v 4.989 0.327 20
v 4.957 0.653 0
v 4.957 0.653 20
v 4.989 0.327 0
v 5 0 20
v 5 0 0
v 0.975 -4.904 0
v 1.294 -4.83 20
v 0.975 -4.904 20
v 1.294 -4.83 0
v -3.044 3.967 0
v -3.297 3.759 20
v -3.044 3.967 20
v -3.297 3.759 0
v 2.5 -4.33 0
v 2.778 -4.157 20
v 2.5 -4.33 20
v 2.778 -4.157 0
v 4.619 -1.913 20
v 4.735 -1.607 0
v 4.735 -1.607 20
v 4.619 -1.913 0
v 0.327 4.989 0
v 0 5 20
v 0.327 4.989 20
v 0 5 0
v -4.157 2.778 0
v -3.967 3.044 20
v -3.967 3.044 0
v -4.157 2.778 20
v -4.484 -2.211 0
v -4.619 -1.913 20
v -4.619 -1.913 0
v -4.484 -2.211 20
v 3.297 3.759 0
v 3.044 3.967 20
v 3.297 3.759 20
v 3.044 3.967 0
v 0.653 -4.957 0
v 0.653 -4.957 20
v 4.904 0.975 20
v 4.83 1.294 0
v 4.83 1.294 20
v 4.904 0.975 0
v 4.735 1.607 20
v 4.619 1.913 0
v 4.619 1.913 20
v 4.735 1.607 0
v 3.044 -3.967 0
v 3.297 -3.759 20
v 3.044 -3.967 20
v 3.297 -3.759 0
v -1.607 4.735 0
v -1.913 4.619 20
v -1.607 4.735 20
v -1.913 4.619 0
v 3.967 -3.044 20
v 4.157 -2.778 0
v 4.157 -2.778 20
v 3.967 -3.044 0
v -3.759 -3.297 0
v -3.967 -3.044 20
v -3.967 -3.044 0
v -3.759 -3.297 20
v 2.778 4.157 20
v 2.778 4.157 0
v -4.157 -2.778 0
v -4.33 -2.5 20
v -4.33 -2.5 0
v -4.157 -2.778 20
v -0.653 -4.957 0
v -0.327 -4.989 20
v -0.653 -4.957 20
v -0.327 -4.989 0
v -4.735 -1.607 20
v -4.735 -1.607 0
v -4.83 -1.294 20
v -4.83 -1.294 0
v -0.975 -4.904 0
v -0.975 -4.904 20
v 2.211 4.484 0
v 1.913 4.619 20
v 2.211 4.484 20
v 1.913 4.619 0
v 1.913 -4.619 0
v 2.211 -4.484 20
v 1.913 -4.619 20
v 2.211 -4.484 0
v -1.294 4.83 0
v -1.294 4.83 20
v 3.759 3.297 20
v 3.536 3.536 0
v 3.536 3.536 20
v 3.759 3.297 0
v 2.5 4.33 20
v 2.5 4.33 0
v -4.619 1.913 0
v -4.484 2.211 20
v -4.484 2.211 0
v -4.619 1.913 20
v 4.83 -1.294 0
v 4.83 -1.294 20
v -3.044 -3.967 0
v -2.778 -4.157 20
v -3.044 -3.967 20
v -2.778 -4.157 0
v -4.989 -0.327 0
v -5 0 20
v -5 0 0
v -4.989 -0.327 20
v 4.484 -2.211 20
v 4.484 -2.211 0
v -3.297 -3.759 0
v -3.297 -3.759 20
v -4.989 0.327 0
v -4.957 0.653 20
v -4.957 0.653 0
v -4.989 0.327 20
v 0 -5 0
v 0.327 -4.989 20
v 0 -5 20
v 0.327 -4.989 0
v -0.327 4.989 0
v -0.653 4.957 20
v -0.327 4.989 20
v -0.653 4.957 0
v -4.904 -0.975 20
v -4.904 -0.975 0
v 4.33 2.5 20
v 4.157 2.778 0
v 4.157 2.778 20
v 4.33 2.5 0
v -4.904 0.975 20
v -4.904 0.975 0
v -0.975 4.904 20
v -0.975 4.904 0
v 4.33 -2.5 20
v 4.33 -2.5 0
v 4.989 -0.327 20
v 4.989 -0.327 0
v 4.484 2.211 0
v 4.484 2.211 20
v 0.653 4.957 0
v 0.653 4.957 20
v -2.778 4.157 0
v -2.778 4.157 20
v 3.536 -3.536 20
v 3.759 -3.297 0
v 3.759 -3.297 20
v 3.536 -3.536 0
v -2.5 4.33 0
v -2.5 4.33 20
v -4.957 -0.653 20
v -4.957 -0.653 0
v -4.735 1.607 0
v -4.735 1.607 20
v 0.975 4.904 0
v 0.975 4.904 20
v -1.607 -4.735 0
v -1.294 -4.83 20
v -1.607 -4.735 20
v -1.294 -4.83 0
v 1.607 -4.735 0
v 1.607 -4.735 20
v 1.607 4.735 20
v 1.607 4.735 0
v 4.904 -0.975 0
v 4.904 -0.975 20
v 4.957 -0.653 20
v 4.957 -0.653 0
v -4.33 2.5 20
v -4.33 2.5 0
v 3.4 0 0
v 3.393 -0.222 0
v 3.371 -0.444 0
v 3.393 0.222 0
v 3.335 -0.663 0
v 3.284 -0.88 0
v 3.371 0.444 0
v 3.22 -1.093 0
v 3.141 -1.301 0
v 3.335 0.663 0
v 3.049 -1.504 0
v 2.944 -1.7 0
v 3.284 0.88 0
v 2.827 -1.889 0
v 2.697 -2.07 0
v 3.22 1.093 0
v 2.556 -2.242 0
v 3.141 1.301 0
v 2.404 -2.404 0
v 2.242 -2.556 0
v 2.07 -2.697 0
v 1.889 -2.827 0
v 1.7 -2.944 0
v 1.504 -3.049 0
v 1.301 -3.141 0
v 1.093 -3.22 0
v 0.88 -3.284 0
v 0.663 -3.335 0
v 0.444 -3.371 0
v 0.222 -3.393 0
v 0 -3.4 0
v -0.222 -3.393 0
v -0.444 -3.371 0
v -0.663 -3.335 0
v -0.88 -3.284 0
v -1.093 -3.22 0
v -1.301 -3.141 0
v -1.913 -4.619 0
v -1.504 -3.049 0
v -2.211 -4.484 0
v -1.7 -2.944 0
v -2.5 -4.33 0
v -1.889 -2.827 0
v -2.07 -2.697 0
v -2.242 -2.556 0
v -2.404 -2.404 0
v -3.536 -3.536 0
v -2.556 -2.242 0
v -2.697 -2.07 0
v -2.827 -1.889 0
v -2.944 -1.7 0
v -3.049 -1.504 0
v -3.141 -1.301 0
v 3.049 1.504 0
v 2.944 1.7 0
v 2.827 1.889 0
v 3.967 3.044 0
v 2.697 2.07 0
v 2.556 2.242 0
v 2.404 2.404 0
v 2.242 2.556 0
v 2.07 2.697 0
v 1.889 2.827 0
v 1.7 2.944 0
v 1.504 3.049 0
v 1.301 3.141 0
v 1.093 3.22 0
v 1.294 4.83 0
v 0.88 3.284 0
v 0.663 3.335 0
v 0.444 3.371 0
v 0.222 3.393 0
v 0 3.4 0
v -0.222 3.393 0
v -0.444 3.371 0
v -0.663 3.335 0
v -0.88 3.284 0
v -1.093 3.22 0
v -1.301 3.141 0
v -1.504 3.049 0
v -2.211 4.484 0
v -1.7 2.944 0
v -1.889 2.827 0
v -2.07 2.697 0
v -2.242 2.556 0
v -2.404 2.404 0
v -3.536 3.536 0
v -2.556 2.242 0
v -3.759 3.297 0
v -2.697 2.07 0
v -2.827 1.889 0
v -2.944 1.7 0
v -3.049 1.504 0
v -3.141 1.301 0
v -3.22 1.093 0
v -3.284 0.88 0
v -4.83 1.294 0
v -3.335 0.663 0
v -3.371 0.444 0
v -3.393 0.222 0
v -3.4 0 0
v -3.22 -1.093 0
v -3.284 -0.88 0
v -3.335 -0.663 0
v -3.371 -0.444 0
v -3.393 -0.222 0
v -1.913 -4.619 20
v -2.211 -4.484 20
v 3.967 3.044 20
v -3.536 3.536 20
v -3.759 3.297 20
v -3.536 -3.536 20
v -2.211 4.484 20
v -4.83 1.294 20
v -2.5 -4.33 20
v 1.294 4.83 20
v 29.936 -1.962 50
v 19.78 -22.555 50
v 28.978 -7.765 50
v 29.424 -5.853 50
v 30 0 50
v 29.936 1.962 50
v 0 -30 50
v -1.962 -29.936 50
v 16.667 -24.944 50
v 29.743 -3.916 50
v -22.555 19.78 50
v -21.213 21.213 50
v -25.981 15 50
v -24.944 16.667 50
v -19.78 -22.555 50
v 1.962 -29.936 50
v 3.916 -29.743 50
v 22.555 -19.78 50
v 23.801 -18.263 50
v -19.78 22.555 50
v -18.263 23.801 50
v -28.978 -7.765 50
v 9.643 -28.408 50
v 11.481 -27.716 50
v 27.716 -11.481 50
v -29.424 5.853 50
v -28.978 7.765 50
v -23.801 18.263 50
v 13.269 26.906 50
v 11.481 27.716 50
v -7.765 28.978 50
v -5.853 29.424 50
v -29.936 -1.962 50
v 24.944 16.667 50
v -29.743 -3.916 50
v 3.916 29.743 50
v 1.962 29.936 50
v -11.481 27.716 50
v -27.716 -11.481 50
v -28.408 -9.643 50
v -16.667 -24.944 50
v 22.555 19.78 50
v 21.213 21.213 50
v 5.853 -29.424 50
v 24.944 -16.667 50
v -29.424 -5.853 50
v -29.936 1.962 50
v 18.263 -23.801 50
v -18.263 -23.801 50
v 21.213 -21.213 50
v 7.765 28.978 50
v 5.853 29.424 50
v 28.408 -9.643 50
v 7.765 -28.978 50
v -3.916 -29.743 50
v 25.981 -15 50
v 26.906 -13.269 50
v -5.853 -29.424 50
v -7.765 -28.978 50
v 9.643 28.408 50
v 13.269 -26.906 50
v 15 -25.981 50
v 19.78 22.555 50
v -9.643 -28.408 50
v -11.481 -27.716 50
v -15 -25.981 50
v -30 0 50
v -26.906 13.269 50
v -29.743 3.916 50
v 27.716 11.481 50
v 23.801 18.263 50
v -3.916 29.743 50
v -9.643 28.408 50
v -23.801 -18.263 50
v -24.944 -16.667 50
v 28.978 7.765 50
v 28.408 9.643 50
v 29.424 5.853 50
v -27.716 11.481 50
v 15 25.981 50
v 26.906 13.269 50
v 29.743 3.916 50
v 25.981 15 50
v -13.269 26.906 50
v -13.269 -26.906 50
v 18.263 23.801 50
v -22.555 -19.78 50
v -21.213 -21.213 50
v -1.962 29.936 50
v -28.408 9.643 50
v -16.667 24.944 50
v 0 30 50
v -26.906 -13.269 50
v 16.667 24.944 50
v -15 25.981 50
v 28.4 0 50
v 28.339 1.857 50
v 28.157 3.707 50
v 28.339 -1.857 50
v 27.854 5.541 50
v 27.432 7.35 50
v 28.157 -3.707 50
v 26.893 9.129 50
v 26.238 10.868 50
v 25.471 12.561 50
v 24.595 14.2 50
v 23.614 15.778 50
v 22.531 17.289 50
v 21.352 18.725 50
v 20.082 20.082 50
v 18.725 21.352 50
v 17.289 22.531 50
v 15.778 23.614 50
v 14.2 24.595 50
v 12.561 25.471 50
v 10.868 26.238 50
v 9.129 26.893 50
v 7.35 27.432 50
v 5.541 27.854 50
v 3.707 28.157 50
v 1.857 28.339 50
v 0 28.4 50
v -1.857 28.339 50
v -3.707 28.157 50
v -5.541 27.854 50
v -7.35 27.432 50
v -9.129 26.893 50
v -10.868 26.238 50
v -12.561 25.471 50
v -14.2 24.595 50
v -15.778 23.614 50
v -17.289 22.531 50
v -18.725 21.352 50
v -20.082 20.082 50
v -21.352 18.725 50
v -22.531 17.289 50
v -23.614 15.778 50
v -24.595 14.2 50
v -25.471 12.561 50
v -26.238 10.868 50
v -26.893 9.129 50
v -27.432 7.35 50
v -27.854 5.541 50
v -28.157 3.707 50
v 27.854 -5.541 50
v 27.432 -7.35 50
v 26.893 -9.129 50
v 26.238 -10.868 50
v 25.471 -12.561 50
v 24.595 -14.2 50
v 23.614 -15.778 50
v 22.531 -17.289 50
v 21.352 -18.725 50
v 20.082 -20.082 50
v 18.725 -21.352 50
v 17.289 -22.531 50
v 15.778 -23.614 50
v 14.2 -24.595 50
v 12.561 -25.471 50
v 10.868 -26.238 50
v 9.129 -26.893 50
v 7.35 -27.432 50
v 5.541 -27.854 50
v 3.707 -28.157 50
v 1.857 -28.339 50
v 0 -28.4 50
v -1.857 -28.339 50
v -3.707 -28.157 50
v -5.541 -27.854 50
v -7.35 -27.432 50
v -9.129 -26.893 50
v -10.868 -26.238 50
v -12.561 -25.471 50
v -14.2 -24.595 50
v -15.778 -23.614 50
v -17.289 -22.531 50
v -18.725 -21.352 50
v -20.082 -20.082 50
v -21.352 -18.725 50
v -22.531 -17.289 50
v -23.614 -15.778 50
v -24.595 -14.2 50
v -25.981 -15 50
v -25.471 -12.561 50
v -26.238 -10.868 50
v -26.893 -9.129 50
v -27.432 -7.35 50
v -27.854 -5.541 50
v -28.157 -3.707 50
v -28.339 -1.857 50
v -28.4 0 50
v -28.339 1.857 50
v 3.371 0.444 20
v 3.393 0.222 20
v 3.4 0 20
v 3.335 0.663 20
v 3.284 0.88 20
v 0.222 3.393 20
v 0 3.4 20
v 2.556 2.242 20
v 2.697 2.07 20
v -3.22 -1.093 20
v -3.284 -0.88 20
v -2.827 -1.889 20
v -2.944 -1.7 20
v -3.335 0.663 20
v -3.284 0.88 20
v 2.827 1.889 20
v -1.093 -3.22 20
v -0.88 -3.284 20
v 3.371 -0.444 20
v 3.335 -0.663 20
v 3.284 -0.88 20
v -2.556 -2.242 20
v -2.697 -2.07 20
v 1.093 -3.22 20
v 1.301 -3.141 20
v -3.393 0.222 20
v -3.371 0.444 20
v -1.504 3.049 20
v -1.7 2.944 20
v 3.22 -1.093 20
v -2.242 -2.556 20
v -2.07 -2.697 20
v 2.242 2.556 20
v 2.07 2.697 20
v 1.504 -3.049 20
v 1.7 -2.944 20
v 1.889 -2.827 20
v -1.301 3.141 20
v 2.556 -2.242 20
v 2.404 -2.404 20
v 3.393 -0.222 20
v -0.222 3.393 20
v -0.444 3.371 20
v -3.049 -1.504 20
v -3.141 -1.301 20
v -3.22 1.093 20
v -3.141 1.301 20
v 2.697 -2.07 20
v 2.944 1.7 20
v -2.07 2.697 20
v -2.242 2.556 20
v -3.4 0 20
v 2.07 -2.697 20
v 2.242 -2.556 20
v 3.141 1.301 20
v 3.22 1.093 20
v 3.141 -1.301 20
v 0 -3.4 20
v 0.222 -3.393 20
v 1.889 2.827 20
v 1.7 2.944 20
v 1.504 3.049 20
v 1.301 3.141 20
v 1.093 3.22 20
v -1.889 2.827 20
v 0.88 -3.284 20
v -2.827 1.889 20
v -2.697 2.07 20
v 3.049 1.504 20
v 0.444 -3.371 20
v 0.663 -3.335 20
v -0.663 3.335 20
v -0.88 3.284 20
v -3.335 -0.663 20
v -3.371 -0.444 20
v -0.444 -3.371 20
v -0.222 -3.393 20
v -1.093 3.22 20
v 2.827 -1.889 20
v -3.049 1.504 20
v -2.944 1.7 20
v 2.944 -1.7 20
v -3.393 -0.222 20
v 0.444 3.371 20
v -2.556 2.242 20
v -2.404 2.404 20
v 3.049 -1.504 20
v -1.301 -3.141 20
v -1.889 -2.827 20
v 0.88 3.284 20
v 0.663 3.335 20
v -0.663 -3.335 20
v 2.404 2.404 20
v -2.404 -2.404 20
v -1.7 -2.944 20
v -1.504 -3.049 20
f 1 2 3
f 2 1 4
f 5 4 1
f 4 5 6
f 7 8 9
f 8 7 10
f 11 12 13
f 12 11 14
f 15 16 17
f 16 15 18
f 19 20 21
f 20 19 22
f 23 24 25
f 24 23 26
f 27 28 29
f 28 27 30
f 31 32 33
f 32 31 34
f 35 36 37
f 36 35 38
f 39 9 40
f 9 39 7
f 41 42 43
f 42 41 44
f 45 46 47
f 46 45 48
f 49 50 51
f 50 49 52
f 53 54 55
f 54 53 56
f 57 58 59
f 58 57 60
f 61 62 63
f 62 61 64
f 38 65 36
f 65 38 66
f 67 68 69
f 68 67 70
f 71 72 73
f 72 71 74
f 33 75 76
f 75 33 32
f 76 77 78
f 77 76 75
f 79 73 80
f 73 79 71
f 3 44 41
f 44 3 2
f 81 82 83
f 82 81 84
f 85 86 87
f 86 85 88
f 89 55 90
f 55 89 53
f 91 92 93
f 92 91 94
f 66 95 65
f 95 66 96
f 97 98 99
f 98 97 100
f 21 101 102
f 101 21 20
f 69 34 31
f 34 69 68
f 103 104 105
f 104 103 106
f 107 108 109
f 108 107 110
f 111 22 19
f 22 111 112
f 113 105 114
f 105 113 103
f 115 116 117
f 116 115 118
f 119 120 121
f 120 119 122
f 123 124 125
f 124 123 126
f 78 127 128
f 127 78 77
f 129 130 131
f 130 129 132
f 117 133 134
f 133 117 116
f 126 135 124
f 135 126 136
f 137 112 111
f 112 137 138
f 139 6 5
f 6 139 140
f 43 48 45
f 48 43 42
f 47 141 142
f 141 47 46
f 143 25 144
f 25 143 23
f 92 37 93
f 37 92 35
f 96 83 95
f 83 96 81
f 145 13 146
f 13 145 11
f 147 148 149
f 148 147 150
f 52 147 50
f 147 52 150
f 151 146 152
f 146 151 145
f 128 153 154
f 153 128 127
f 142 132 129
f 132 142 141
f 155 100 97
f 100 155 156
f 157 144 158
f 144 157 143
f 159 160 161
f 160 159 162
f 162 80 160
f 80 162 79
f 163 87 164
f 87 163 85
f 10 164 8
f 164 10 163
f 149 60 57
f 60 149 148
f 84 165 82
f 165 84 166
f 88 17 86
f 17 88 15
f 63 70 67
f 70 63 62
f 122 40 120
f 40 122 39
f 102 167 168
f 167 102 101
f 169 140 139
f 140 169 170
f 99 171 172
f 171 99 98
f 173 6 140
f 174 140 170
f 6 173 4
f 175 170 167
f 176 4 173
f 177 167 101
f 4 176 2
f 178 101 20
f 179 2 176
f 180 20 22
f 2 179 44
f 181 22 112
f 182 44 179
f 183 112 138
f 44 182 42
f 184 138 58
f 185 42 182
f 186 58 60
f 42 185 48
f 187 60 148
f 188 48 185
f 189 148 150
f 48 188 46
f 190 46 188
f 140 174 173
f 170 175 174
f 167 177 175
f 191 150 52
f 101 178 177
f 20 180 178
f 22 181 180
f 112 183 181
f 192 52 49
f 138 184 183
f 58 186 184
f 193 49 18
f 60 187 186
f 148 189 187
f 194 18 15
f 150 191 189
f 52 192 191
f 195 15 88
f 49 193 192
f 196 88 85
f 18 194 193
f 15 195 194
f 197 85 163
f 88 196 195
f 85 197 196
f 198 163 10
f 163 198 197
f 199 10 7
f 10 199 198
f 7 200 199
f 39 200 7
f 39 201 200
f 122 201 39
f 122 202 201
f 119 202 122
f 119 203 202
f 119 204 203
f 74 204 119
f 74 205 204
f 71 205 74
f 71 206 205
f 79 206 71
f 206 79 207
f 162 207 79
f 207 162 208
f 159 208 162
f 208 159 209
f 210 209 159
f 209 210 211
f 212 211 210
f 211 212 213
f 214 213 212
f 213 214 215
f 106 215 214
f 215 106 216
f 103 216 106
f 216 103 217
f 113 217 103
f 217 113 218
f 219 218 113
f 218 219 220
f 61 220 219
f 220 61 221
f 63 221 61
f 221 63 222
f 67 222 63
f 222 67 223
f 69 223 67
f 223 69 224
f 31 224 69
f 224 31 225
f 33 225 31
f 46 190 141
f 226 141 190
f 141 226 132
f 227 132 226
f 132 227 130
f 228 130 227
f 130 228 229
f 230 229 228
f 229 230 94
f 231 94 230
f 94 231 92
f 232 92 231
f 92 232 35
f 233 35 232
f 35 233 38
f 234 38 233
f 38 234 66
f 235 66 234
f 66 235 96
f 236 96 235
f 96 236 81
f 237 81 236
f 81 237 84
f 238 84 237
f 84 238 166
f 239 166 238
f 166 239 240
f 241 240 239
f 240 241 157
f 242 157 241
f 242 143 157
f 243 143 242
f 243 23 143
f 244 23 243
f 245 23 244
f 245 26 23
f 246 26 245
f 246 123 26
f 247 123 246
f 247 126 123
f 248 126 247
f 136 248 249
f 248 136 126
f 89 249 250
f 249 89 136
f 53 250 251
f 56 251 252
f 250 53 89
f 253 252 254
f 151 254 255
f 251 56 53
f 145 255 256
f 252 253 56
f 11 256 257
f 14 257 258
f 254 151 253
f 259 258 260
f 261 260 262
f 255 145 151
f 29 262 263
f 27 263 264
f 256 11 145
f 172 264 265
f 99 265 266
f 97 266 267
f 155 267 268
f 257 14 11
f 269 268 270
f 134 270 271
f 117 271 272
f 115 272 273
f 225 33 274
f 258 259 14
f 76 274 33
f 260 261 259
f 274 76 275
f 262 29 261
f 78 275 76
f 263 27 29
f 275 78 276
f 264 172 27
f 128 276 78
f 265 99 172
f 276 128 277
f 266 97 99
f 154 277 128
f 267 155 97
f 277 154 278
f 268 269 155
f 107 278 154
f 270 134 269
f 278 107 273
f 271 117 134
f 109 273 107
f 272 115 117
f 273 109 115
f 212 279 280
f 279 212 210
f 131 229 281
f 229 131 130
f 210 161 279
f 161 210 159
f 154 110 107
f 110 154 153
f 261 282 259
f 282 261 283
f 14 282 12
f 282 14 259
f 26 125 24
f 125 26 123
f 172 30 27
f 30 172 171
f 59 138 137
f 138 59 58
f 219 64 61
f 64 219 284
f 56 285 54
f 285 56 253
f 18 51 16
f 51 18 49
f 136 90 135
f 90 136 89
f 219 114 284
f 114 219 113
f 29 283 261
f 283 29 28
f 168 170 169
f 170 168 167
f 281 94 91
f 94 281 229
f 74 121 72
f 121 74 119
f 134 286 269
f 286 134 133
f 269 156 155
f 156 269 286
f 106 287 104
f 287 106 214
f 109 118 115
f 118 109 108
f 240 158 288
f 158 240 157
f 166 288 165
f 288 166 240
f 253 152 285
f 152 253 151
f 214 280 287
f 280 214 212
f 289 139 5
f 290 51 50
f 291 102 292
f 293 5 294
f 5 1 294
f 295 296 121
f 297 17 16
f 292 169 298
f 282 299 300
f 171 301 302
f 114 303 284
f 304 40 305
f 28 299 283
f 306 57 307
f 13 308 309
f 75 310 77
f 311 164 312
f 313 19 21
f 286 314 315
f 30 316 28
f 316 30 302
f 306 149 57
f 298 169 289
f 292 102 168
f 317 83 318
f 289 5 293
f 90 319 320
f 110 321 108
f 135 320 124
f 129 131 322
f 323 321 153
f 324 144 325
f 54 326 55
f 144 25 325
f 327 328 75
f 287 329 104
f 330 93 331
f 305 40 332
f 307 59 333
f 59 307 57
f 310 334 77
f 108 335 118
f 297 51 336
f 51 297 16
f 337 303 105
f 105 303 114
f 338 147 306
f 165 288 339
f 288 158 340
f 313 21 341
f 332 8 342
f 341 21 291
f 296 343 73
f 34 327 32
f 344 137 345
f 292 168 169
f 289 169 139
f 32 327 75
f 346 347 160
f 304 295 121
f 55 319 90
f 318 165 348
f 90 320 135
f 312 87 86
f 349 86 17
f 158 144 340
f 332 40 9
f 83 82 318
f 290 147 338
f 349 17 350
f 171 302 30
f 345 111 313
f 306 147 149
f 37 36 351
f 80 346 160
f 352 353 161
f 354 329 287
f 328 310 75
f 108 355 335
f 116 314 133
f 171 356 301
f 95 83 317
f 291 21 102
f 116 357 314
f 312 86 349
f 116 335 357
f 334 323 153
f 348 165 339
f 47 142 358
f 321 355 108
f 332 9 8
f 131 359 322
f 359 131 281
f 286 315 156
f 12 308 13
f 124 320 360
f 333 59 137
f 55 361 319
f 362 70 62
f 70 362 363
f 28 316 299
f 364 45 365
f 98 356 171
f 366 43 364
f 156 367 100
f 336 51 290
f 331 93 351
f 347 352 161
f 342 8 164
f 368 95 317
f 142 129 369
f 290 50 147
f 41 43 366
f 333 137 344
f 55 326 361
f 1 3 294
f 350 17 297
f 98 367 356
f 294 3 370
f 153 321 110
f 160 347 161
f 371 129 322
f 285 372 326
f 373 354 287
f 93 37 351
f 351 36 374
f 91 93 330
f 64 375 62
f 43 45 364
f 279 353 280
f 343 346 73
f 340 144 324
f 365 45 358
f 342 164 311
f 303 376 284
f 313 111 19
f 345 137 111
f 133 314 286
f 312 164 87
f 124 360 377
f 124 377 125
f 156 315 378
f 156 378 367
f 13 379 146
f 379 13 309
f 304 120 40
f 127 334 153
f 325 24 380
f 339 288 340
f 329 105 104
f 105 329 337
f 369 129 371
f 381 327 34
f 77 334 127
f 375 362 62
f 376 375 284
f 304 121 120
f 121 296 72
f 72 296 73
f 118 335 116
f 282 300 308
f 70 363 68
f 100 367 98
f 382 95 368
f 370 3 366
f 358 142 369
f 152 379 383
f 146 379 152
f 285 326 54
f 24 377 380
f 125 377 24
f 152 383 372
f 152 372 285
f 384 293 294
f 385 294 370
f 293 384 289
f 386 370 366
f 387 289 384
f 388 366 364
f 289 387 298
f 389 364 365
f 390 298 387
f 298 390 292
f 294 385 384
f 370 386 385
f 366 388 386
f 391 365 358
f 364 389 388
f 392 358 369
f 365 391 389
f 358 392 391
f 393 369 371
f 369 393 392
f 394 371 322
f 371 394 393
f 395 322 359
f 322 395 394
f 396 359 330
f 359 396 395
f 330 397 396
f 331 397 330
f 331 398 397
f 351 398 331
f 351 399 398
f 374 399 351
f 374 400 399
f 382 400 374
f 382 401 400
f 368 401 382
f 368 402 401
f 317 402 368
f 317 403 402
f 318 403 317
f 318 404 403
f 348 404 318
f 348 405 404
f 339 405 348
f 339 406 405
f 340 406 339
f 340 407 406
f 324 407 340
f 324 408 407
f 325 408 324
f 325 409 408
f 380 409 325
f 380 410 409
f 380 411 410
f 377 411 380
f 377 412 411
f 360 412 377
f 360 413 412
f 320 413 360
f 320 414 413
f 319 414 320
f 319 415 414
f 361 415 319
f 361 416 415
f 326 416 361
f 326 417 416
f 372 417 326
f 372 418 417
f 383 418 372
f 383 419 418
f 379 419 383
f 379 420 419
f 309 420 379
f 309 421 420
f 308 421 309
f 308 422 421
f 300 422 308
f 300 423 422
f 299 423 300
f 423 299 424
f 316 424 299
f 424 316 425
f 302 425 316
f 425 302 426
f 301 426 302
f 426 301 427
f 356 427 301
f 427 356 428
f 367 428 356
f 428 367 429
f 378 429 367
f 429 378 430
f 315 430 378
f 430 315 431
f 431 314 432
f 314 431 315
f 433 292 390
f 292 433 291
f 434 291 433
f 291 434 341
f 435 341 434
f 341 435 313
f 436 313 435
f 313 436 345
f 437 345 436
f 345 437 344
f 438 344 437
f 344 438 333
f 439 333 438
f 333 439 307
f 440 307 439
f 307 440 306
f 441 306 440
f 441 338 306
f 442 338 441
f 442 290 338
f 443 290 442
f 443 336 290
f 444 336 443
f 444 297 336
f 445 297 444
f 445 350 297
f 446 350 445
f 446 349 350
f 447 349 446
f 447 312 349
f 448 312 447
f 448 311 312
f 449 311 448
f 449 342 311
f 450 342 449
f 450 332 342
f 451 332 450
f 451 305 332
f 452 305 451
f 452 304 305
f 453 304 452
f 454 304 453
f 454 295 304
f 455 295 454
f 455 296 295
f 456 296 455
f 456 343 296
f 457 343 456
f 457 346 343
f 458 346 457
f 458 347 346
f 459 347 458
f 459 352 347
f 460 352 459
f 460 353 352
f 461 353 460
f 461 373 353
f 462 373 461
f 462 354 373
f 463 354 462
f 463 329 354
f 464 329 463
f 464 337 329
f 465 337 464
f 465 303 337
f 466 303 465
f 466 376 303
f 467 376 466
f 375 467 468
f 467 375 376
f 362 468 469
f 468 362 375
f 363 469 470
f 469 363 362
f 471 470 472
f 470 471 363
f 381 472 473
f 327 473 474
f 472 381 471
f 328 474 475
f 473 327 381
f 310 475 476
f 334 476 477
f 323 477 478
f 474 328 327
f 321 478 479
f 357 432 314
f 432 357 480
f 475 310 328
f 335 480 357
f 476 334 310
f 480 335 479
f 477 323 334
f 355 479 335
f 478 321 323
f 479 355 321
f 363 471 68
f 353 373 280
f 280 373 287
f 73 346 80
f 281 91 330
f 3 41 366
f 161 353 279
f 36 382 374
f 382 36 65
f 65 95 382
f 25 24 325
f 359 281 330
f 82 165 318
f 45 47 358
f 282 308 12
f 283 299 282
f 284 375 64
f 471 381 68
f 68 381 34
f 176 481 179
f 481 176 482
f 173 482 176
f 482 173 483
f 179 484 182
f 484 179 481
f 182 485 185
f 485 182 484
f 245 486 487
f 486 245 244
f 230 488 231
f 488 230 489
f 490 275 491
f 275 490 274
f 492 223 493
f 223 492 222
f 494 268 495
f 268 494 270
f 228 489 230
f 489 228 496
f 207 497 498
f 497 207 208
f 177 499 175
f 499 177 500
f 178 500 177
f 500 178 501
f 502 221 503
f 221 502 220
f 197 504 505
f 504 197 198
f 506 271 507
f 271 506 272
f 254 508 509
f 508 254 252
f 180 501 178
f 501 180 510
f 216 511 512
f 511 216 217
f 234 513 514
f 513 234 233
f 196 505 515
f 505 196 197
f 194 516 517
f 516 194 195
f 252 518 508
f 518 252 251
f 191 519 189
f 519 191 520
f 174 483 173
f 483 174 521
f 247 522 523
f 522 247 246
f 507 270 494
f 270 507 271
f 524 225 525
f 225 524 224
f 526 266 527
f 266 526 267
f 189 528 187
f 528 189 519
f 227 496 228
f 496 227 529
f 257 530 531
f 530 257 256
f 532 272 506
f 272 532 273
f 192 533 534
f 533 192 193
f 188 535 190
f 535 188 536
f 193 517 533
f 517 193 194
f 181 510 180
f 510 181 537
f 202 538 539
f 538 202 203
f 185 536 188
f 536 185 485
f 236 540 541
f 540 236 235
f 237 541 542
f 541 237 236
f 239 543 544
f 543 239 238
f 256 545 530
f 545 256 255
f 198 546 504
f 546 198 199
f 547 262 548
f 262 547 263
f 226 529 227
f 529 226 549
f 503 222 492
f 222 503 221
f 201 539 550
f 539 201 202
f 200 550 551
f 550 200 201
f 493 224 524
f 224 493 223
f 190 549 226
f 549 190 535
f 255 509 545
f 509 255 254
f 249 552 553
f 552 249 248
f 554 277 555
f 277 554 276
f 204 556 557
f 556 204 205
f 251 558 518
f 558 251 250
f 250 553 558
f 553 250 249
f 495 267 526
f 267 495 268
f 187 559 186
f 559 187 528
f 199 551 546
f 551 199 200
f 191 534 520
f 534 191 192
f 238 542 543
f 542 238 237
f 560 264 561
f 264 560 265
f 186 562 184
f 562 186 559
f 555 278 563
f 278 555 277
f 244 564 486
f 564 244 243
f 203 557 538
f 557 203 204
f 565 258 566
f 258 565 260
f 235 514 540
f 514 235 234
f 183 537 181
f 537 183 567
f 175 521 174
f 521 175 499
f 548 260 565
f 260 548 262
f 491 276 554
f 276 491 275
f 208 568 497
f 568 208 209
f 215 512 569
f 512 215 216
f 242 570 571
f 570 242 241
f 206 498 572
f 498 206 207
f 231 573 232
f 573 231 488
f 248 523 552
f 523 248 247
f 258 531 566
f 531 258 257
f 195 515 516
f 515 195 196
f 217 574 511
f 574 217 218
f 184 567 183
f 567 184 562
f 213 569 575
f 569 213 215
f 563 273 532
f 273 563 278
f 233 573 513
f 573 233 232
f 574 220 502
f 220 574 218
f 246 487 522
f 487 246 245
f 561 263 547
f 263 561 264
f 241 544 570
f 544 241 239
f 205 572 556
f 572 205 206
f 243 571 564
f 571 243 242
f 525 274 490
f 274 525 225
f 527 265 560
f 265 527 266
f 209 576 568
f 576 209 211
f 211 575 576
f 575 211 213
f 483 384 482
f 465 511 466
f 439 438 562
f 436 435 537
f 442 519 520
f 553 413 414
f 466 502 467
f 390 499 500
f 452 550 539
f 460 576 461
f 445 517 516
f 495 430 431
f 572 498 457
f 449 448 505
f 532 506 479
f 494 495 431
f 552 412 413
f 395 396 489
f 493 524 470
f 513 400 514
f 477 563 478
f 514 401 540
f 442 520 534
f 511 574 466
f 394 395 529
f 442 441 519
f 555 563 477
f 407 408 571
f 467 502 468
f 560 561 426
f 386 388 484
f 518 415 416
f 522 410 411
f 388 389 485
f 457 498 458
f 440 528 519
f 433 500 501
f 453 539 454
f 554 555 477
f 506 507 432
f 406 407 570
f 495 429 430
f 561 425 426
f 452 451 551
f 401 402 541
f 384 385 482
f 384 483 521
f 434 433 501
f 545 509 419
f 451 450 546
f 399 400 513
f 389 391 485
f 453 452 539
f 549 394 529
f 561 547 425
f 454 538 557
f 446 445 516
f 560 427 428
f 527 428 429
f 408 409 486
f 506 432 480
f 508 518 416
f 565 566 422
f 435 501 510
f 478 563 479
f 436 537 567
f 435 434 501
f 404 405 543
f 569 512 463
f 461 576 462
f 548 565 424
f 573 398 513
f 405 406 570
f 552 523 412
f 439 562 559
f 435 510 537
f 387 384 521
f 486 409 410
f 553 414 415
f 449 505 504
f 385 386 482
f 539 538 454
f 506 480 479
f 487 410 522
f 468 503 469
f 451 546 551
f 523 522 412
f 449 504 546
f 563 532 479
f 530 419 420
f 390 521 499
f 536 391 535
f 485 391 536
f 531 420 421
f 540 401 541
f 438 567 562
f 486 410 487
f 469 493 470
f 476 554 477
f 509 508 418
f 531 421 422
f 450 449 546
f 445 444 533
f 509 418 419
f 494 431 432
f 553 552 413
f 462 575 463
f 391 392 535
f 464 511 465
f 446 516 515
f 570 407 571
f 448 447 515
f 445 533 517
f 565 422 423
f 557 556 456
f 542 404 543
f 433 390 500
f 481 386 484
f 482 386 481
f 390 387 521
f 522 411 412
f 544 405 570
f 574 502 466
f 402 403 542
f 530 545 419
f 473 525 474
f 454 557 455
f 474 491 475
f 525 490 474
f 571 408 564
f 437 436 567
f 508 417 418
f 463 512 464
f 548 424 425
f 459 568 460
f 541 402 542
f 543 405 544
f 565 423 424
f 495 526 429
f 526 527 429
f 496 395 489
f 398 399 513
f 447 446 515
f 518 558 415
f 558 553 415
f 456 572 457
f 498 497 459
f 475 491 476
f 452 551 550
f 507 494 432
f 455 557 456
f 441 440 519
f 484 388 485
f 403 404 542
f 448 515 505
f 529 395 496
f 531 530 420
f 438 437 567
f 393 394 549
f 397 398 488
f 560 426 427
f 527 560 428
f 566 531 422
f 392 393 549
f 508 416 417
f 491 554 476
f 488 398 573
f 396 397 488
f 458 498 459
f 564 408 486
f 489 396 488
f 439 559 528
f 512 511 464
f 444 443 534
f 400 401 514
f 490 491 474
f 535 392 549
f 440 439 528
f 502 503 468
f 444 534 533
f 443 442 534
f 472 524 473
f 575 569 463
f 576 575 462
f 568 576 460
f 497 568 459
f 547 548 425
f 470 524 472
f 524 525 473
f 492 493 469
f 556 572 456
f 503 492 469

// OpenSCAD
// Small lab funnel - upright print, straight spout at bottom, conical top.
// Dimensions measured with calipers.

// Spout dimensions
spout_od = 10;      // Outer diameter of spout
spout_id = 6.8;     // Inner diameter of spout (spout_od - 2*wall)
spout_z  = 20;      // Height of spout section

// Cone dimensions
cone_bottom_od = 10; // Matches spout outer diameter
cone_top_od    = 60; // Outer diameter at rim
cone_wall      = 1.6; // Wall thickness everywhere
cone_z         = 30; // Height of cone section (from z=20 to z=50)

// Derived dimensions
wall = cone_wall;
cone_top_id = cone_top_od - 2 * wall;

// Orientation: Rests on XY plane at z=0, builds upward.
// Centred on origin in X and Y.
// $fn set high for smooth curves.
$fn = 96;

module funnel() {
    difference() {
        // --- Outer Shell ---
        union() {
            // 1. Straight Spout (Cylinder)
            // From z=0 to z=20. Outer radius = 5.
            translate([0, 0, 0]) 
                cylinder(h = spout_z, d = spout_od);

            // 2. Conical Top
            // From z=20 to z=50.
            // Outer radius at z=20 is 5. Outer radius at z=50 is 30.
            // We use a cylinder with d1 and d2 to create the cone shape.
            translate([0, 0, spout_z]) 
                cylinder(h = cone_z, d1 = cone_bottom_od, d2 = cone_top_od);
        }

        // --- Inner Bore (Holes) ---
        // We subtract the inner volume to make it hollow.
        // 1. Inner Spout Hole
        // From z=0 to z=20. Inner radius = 3.4.
        translate([0, 0, 0]) 
            cylinder(h = spout_z, d = spout_id);

        // 2. Inner Cone Hole
        // From z=20 to z=50.
        // Inner radius at z=20 is 3.4. Inner radius at z=50 is 28 (60 - 2*1.6).
        translate([0, 0, spout_z]) 
            cylinder(h = cone_z, d1 = spout_id, d2 = cone_top_id);
    }
}

funnel();
